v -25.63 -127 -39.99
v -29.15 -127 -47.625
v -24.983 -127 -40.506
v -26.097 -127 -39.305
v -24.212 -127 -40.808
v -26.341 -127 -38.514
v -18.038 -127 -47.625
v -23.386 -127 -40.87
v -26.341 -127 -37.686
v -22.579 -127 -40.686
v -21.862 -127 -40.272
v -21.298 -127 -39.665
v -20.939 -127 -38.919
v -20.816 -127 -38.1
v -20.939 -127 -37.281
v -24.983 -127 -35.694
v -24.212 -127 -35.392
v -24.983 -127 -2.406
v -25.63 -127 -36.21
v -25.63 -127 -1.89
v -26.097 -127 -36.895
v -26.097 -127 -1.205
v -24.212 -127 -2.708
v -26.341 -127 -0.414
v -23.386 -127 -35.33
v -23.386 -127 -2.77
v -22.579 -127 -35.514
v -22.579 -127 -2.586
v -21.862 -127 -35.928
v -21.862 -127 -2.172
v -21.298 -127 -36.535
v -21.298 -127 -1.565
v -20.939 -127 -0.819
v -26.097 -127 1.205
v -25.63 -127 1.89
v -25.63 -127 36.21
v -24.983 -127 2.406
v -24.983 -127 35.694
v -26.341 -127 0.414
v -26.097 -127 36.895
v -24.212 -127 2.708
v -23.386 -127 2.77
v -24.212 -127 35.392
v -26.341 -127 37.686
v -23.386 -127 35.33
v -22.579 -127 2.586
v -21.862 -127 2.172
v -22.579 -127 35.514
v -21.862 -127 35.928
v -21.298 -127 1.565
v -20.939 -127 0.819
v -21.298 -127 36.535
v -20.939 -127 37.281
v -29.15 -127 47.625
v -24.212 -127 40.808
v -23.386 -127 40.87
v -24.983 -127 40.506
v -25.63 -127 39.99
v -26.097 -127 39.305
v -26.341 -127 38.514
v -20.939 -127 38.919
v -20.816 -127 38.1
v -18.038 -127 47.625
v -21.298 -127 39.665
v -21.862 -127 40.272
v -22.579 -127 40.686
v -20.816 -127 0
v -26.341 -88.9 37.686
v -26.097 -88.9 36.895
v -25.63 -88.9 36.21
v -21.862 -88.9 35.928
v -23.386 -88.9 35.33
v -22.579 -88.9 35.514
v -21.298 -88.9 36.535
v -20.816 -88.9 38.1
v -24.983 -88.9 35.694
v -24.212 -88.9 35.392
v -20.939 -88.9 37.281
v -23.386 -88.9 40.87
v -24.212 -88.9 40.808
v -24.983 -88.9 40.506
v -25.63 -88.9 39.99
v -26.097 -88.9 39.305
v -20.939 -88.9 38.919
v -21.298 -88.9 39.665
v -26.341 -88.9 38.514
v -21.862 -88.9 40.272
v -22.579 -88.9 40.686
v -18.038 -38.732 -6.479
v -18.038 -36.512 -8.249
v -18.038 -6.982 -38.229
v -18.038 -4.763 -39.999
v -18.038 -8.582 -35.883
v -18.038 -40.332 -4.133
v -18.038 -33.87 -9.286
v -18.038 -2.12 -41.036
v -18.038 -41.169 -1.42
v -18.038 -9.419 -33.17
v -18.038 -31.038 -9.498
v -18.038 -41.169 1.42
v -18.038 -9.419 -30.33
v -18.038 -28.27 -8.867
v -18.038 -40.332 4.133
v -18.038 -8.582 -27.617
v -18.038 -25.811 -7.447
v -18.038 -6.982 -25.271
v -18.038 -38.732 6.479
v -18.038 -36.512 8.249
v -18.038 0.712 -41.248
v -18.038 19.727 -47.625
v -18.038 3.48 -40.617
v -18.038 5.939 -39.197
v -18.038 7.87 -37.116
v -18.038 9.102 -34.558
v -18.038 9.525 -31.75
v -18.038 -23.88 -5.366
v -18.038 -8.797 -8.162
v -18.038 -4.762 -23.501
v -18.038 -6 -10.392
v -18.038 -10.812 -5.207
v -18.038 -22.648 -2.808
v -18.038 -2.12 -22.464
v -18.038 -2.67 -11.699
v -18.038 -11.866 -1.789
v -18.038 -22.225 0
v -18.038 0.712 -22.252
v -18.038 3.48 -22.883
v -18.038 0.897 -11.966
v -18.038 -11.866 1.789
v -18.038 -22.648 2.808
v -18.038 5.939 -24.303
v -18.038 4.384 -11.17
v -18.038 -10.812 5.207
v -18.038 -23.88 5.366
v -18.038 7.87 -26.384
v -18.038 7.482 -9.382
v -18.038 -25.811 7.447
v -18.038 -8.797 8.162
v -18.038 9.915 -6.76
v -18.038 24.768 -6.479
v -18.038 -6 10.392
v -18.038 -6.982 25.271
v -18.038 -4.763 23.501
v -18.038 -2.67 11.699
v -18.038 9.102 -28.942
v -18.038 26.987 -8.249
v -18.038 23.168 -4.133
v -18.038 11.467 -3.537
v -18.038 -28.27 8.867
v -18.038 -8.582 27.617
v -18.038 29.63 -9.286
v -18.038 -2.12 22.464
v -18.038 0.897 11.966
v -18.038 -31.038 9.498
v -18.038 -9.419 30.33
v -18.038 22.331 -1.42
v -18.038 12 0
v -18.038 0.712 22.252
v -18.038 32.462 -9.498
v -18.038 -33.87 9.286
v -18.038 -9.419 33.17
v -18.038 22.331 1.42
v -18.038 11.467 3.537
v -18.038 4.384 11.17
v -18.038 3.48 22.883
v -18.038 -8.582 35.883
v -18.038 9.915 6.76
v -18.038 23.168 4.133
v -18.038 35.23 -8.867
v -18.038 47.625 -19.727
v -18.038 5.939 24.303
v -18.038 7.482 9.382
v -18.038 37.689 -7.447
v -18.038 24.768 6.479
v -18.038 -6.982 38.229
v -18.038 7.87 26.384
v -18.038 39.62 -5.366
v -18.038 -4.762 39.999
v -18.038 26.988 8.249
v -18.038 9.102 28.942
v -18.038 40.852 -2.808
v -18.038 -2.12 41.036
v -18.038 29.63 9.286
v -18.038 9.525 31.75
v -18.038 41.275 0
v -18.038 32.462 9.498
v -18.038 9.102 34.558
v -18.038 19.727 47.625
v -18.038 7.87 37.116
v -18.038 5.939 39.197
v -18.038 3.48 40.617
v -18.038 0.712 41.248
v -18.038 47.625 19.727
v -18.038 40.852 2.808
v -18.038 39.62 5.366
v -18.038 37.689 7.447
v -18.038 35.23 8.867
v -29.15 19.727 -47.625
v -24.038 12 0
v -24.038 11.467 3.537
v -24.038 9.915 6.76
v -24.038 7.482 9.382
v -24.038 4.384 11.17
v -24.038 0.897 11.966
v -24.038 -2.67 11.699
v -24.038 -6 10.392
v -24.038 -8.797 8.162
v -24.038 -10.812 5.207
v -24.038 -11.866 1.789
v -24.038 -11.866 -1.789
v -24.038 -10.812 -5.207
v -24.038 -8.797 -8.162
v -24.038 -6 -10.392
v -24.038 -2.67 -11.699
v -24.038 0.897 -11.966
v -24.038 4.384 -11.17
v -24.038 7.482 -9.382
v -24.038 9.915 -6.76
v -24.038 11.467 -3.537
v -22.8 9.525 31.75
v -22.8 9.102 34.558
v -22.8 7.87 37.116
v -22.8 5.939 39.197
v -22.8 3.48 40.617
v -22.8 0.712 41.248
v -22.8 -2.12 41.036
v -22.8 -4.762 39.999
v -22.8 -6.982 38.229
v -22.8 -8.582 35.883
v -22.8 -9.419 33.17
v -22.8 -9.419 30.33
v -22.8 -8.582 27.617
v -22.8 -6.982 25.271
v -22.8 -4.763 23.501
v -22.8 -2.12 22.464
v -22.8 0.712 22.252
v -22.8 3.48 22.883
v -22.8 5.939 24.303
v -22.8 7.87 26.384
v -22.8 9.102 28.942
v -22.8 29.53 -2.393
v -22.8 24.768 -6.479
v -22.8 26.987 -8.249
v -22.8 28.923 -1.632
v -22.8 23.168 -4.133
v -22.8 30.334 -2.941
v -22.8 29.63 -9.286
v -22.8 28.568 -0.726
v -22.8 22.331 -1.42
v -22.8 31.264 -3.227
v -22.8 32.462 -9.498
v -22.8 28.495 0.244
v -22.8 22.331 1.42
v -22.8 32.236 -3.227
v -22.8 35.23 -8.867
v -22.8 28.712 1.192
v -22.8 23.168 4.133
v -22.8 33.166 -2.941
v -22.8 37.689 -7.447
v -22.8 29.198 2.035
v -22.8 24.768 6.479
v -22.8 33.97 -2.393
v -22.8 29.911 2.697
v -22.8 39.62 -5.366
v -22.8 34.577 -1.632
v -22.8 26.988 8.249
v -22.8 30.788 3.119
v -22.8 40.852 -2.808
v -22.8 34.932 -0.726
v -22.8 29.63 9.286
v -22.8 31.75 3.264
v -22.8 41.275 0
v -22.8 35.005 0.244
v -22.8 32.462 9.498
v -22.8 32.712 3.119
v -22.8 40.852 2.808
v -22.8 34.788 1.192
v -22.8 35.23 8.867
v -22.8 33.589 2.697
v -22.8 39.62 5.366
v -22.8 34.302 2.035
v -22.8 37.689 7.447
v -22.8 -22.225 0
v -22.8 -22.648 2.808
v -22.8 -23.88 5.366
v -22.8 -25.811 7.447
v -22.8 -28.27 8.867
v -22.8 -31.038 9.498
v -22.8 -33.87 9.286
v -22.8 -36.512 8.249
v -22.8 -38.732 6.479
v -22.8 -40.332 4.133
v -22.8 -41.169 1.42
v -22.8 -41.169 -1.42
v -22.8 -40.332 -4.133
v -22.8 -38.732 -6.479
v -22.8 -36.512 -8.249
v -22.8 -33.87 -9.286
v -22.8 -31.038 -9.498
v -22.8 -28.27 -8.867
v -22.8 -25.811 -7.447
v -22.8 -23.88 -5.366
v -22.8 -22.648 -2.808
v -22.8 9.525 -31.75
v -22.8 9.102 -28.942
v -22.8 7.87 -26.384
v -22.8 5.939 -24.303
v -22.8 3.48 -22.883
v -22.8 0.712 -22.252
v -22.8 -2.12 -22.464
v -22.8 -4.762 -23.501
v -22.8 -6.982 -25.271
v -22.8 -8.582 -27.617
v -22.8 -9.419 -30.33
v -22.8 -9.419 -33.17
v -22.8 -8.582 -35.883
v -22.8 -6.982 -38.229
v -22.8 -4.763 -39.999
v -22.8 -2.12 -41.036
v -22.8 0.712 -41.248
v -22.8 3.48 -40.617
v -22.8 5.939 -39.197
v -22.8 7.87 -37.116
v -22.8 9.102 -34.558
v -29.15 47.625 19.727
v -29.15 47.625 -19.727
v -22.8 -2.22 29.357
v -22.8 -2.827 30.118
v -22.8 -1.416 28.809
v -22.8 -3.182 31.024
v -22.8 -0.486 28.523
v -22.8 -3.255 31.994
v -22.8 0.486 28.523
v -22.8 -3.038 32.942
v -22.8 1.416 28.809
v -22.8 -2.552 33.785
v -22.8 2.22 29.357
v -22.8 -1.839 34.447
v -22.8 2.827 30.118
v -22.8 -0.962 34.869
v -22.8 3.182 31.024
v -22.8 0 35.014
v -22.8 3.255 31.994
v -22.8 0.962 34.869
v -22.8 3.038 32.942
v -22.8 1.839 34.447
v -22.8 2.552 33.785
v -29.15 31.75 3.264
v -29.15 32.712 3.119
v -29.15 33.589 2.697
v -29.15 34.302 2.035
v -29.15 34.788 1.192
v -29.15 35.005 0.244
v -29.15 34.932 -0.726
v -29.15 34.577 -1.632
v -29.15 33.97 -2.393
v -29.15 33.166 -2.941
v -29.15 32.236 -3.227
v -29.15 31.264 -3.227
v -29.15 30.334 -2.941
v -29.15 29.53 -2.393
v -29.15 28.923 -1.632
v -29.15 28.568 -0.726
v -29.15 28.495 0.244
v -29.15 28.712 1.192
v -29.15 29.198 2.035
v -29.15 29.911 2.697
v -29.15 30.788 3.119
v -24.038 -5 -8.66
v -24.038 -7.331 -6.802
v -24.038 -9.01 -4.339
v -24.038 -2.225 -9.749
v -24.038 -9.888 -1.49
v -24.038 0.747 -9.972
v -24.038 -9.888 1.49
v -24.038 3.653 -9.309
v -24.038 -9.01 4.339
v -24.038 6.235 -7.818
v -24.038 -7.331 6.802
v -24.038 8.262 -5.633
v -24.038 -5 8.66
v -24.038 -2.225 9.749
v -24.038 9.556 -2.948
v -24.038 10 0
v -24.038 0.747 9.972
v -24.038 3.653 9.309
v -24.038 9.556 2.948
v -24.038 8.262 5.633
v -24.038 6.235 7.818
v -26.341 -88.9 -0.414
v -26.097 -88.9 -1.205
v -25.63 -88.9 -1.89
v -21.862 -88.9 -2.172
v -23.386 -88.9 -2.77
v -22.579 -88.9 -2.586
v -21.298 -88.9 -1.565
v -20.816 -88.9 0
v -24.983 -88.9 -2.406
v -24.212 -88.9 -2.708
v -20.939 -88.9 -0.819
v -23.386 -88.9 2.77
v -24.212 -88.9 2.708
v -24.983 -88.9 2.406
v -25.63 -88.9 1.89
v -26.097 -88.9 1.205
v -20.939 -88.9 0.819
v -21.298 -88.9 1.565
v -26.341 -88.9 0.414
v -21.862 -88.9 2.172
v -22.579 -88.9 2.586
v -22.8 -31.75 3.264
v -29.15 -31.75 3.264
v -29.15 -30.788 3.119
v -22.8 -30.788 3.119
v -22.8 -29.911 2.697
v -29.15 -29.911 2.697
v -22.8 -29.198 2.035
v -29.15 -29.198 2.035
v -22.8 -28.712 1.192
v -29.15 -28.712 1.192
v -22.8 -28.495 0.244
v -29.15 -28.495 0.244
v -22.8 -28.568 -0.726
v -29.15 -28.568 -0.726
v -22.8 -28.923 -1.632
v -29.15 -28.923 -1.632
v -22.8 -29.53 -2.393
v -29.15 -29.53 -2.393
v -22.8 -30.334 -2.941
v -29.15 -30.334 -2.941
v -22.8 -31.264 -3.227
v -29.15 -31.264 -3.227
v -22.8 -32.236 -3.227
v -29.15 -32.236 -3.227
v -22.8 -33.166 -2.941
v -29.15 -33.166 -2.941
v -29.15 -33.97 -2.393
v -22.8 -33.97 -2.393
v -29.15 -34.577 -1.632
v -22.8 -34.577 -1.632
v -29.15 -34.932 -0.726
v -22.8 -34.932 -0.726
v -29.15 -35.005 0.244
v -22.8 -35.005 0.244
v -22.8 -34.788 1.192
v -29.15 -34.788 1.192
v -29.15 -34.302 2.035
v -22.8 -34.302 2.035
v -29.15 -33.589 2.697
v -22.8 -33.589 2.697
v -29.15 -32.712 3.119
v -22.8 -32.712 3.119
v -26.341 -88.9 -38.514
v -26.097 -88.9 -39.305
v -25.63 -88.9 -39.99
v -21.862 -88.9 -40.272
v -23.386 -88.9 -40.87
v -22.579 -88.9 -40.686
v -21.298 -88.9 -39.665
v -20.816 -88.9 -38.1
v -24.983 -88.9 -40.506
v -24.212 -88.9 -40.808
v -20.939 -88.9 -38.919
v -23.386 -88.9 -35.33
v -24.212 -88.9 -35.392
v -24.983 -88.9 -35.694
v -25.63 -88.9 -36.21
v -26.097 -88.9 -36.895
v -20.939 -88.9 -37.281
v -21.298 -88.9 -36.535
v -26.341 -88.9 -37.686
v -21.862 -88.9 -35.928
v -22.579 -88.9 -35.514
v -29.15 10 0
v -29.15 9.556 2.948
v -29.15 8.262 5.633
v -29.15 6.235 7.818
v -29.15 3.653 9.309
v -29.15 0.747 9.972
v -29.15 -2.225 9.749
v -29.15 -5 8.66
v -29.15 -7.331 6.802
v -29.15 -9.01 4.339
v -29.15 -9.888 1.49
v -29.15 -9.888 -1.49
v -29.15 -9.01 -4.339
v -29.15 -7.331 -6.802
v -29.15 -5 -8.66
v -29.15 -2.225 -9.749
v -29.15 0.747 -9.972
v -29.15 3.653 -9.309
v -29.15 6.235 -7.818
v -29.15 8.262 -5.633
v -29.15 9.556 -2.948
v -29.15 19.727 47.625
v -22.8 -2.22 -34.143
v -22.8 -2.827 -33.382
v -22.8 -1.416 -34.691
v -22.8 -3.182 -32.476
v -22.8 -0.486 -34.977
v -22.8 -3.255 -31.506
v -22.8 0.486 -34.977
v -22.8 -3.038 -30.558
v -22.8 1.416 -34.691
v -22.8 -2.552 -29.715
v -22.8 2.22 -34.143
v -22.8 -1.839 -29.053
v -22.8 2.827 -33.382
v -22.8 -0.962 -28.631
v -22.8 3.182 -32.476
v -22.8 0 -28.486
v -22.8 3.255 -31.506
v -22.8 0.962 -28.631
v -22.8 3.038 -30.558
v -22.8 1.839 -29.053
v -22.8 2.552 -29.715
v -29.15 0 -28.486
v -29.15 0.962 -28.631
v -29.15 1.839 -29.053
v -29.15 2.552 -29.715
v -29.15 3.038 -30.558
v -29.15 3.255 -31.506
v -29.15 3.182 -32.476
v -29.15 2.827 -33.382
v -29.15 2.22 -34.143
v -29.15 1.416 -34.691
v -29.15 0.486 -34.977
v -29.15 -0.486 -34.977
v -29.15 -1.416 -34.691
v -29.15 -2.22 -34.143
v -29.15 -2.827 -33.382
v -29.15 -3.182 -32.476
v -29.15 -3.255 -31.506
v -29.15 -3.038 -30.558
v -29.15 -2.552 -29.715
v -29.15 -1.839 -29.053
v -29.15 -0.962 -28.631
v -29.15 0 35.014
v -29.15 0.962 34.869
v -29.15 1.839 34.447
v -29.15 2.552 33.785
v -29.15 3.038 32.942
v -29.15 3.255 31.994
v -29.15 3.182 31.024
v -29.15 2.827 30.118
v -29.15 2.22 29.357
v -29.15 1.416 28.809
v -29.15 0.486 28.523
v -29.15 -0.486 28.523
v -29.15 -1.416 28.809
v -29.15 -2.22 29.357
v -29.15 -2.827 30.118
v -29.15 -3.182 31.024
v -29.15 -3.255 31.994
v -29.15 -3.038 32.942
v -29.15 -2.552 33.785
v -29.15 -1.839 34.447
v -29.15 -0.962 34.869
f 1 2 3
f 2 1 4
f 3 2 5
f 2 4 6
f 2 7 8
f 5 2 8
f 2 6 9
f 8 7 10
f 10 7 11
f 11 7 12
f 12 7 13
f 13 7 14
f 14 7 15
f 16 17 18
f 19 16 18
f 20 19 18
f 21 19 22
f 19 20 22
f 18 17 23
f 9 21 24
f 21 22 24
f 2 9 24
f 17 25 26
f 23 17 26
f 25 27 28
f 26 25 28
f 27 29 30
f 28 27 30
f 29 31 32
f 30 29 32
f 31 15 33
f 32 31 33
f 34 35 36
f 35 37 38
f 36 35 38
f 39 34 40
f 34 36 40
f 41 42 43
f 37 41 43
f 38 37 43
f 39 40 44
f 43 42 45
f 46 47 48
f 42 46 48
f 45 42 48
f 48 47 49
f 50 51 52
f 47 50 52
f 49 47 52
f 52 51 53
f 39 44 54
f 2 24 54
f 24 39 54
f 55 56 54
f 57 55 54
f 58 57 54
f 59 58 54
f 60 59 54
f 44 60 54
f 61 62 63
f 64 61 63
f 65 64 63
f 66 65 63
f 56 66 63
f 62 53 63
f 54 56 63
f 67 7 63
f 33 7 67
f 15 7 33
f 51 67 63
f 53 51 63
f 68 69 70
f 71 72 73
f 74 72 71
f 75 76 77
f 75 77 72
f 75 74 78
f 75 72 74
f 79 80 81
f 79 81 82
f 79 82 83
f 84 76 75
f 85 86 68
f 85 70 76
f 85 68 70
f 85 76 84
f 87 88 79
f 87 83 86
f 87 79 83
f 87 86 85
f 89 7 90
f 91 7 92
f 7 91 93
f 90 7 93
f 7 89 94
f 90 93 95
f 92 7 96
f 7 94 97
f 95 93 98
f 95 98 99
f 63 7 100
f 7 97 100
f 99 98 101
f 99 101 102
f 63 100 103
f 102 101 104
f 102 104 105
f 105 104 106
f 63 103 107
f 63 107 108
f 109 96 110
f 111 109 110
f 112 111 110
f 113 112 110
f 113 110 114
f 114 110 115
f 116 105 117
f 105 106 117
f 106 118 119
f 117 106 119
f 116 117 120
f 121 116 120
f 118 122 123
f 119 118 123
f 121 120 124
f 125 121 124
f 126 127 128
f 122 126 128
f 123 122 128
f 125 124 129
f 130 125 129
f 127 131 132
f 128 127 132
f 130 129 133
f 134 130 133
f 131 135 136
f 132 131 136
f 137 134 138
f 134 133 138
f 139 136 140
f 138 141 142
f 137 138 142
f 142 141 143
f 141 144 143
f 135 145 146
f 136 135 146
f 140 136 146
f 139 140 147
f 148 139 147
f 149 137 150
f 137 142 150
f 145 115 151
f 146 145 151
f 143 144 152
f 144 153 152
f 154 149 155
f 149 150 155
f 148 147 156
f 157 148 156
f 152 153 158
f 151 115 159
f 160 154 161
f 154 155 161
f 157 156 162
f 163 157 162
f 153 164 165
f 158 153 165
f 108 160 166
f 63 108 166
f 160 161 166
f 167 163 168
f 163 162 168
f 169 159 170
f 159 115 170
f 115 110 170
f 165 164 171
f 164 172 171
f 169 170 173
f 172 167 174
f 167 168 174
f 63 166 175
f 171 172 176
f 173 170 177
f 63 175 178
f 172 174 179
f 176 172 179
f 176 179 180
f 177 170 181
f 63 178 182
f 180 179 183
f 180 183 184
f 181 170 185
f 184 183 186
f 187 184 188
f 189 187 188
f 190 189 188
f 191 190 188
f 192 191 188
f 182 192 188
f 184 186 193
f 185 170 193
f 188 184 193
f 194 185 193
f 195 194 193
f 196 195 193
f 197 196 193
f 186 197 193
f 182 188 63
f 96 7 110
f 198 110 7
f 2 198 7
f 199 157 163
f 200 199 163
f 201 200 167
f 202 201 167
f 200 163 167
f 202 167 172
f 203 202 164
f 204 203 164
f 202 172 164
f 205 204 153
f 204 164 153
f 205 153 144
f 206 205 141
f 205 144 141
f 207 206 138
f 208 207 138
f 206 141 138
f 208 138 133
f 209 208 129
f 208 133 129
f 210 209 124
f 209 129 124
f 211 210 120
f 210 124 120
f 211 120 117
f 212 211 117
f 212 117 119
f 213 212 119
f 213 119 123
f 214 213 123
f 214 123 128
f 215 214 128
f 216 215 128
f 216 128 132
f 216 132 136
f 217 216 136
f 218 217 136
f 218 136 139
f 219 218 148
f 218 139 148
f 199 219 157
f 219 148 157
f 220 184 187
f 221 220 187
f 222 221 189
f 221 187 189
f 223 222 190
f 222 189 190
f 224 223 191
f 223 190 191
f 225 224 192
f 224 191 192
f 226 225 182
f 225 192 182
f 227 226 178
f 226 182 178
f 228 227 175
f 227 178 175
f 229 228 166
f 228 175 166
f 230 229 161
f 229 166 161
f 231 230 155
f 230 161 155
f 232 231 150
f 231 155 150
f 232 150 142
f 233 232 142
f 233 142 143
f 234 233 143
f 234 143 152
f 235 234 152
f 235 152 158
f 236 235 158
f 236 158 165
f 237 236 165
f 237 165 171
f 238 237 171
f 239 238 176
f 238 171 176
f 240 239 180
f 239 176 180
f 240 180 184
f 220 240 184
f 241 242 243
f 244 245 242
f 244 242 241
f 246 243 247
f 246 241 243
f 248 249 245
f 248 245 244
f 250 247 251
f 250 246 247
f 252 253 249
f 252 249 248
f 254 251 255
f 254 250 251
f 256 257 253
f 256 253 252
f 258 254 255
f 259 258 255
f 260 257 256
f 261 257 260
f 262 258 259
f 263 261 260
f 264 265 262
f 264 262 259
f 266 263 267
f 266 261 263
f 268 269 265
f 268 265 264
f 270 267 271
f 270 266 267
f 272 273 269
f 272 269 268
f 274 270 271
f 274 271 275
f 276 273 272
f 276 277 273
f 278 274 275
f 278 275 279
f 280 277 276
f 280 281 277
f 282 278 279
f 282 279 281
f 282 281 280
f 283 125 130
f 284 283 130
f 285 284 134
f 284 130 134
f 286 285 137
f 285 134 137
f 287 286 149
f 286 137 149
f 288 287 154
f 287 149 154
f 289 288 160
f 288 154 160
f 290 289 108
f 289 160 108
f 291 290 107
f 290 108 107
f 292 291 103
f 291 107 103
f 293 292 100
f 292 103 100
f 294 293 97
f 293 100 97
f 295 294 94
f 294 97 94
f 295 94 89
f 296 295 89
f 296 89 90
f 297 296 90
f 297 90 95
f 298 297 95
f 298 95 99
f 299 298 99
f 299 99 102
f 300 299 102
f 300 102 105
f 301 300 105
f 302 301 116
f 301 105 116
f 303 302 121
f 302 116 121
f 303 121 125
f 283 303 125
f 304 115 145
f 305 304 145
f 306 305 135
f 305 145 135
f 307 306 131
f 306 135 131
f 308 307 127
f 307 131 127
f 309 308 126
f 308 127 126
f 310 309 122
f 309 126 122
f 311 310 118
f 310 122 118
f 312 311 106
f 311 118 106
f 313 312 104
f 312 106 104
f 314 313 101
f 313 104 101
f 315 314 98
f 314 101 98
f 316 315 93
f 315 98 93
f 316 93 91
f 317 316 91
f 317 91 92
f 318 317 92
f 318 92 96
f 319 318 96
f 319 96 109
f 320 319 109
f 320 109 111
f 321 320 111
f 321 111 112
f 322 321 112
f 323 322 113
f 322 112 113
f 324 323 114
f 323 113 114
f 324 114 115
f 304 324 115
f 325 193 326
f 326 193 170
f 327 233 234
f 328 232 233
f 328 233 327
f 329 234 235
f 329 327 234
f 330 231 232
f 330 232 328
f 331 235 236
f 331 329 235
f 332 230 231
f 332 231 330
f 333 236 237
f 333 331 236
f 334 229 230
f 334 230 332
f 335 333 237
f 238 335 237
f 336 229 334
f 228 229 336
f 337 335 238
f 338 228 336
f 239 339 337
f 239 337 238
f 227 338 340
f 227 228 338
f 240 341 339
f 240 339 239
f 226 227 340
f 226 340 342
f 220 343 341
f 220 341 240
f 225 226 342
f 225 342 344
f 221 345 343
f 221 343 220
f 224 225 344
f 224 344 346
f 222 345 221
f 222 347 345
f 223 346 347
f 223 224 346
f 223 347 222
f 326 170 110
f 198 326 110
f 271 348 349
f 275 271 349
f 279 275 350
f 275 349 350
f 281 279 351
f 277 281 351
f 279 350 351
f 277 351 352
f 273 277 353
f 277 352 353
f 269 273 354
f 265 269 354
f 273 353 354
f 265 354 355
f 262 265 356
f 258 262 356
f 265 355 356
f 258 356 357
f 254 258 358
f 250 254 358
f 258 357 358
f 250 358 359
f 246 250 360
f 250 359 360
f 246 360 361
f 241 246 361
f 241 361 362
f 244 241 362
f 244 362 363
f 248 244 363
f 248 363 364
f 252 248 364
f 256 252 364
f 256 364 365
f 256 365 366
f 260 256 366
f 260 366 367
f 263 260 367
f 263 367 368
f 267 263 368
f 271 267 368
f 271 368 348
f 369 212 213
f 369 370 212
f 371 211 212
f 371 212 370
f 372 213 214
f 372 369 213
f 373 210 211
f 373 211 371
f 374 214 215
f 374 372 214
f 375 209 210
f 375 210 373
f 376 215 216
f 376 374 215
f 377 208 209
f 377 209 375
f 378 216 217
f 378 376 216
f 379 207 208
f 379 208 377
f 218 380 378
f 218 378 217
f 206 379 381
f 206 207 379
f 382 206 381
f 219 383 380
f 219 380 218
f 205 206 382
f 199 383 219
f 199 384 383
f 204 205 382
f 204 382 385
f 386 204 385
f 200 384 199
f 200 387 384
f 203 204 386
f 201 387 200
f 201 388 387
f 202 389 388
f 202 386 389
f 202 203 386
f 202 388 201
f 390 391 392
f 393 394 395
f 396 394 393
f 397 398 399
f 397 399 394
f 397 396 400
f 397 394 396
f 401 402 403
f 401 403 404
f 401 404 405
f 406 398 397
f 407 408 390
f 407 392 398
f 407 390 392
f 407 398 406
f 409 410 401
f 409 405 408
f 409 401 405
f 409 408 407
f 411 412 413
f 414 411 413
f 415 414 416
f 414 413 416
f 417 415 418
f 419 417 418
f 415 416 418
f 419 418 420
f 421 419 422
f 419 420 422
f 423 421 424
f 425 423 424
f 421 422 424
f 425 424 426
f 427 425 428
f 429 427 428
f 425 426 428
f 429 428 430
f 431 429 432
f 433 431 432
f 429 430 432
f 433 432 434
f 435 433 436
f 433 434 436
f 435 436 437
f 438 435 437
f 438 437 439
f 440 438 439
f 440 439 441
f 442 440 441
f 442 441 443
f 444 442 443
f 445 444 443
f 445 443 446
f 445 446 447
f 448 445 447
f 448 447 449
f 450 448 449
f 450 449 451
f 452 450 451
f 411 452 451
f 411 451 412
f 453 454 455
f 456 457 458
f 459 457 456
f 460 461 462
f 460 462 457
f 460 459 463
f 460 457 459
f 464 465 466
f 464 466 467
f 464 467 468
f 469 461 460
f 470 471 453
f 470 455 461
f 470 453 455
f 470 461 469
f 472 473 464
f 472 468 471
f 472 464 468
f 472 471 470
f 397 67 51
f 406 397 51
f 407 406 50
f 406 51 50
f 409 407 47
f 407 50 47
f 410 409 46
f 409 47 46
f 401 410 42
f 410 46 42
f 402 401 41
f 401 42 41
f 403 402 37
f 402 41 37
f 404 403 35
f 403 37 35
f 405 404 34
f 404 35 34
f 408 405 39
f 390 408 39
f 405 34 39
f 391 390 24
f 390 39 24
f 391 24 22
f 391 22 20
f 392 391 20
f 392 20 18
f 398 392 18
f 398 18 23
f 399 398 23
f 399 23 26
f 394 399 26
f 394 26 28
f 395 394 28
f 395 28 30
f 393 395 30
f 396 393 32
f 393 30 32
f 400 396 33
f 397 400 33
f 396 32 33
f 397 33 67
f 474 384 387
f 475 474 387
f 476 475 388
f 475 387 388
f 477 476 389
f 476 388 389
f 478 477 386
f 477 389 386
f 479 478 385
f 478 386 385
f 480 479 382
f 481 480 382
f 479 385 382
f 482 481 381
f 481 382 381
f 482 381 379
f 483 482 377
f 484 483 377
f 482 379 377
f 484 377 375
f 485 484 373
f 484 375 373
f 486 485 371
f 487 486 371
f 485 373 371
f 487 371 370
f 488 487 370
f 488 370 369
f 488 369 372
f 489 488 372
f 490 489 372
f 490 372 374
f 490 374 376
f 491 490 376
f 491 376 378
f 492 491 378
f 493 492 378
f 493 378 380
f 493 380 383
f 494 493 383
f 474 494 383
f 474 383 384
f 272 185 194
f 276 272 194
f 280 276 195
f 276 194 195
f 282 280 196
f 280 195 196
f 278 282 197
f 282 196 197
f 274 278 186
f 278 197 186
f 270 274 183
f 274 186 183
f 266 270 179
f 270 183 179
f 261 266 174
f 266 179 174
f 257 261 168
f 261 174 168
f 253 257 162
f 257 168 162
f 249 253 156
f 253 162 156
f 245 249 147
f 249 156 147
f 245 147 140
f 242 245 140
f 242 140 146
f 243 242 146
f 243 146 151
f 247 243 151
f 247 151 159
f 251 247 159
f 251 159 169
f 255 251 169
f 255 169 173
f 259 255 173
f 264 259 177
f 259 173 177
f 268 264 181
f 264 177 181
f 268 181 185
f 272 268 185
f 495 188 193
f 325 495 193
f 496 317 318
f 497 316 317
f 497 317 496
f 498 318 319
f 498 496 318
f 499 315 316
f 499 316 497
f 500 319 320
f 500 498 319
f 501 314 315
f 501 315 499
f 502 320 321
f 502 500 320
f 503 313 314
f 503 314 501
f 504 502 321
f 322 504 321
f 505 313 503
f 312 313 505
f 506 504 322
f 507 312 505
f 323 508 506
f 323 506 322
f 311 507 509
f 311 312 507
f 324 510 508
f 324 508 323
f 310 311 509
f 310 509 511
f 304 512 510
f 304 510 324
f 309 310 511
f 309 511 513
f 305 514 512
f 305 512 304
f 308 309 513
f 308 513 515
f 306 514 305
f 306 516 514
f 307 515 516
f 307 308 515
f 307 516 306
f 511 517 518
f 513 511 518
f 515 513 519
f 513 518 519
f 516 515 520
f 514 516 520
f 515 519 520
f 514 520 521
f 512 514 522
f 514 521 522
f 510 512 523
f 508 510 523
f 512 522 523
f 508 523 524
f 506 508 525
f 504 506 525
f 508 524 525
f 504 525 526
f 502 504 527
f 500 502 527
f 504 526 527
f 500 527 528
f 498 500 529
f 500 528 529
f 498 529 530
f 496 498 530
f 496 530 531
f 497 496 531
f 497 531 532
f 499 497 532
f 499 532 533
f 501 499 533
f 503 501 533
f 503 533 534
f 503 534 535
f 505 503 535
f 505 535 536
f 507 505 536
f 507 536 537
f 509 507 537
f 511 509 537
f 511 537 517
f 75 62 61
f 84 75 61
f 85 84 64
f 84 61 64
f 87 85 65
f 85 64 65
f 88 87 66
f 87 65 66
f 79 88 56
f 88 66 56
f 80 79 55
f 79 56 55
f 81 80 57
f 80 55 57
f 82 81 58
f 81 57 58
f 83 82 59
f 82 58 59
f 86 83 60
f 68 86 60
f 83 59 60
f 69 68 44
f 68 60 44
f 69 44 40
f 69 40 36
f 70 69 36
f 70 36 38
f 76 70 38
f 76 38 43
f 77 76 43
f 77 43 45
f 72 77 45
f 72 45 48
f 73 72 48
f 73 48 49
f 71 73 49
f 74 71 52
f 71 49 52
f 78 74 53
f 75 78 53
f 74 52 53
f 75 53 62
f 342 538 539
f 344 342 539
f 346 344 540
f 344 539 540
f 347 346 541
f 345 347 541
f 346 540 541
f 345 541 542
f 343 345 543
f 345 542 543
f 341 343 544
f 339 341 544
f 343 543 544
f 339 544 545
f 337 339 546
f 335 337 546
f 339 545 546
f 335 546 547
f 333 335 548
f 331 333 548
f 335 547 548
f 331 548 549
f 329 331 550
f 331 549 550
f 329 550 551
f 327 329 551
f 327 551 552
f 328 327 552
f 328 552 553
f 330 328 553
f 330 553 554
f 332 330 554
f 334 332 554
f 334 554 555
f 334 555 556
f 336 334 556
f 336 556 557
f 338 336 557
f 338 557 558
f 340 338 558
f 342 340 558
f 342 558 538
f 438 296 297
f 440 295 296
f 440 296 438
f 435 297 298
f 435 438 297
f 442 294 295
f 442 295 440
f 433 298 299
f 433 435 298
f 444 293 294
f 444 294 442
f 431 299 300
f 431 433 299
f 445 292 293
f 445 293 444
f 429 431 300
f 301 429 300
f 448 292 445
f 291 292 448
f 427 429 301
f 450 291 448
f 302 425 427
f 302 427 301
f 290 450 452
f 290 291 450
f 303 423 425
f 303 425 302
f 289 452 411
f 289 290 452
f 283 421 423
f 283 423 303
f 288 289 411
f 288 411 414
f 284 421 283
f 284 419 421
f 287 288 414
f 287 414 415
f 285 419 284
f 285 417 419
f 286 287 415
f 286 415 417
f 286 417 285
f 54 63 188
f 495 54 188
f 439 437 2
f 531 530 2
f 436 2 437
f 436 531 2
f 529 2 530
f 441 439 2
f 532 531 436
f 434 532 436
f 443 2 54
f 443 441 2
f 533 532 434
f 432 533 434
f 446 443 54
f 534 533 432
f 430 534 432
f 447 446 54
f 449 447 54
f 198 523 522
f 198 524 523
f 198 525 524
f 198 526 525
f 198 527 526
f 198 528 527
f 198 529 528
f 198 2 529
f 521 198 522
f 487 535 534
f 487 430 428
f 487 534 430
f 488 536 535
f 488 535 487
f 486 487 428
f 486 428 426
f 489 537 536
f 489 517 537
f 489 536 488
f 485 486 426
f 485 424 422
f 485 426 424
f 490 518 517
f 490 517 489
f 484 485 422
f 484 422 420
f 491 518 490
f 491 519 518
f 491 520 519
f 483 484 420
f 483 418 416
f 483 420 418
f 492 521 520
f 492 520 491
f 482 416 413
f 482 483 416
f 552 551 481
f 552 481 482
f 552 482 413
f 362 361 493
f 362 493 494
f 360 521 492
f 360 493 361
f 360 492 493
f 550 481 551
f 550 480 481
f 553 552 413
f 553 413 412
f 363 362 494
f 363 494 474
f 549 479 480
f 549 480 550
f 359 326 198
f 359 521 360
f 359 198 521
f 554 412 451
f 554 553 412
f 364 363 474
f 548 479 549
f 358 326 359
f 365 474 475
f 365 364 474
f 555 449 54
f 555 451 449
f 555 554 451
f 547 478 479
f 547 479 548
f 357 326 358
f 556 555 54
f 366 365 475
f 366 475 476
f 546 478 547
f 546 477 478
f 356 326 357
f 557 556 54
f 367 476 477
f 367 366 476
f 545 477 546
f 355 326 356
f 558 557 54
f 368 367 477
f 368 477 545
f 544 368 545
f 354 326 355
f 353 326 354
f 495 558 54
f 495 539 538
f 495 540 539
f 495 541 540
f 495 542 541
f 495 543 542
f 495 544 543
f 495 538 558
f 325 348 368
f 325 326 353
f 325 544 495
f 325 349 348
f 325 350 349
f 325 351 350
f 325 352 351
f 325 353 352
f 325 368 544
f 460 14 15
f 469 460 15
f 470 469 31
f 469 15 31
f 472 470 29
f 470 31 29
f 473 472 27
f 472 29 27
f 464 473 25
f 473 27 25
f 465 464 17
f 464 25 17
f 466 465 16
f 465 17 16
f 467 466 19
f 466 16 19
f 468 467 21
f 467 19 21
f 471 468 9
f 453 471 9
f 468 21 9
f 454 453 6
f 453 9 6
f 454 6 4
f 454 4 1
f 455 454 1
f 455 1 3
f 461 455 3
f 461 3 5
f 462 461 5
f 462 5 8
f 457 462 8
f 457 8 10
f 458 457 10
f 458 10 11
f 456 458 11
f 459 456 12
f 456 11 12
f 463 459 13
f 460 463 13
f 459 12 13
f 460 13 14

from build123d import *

# Parameters (mm, degrees)
BOSS_EXTRUDE1_DEPTH = 11.1125
SKETCH2_R           = 12
CUT_EXTRUDE1_DEPTH  = 6
SKETCH3_R           = 10
CUT_EXTRUDE2_DEPTH  = 136.768702671
SKETCH4_R           = 3.2639
CUT_EXTRUDE3_DEPTH  = 137.09051503
SKETCH5_R           = 9.525
CUT_EXTRUDE4_DEPTH  = 4.7625
SKETCH6_R           = 2.778125
CUT_EXTRUDE5_DEPTH  = 38.1


with BuildPart() as part:
    # Sketch1 → Boss-Extrude1 (new body)
    with BuildSketch(Plane(origin=(-18.0375, 0, 0), x_dir=(0, 0, -1), z_dir=(1, 0, 0))):
        Polygon((-47.625, -127), (-47.625, 19.726920908), (-19.726920908, 47.625), (19.726920908, 47.625), (47.625, 19.726920908), (47.625, -127), align=None)
    extrude(amount=-BOSS_EXTRUDE1_DEPTH)

    # Sketch2 → Cut-Extrude1 (cut)
    with BuildSketch(Plane(origin=(-18.0375, 0, 0), x_dir=(0, 0, -1), z_dir=(1, 0, 0))):
        with Locations(Location((0, 0, 0), (0, 0, 90))):
            Circle(SKETCH2_R)
    extrude(amount=-CUT_EXTRUDE1_DEPTH, mode=Mode.SUBTRACT)

    # Sketch3 → Cut-Extrude2 (cut, through all)
    with BuildSketch(Plane(origin=(-24.0375, 0, 0), x_dir=(0, 0, -1), z_dir=(1, 0, 0))):
        with Locations(Location((0, 0, 0), (0, 0, 90))):
            Circle(SKETCH3_R)
    extrude(amount=-CUT_EXTRUDE2_DEPTH, mode=Mode.SUBTRACT)

    # Sketch4 → Cut-Extrude3 (cut, through all)
    with BuildSketch(Plane.ZY.offset(29.15)):
        with Locations((0, -31.75)):
            Circle(SKETCH4_R)
        with Locations((31.75, 0)):
            Circle(SKETCH4_R)
        with Locations((-31.75, 0)):
            Circle(SKETCH4_R)
        with Locations((0, 31.75)):
            Circle(SKETCH4_R)
    extrude(amount=-CUT_EXTRUDE3_DEPTH, mode=Mode.SUBTRACT)

    # Sketch5 → Cut-Extrude4 (cut)
    with BuildSketch(Plane(origin=(-18.0375, 0, 0), x_dir=(0, 0, -1), z_dir=(1, 0, 0))):
        with Locations(Location((-31.75, 0, 0), (0, 0, 90))):
            Circle(SKETCH5_R)
        with Locations(Location((0, 31.75, 0), (0, 0, 90))):
            Circle(SKETCH5_R)
        with Locations(Location((31.75, 0, 0), (0, 0, 90))):
            Circle(SKETCH5_R)
        with Locations(Location((0, -31.75, 0), (0, 0, 90))):
            Circle(SKETCH5_R)
    extrude(amount=-CUT_EXTRUDE4_DEPTH, mode=Mode.SUBTRACT)

    # Sketch6 → Cut-Extrude5 (cut)
    with BuildSketch(Plane.XZ.offset(127)):
        with Locations((-23.59375, 0)):
            Circle(SKETCH6_R)
        with Locations((-23.59375, 38.1)):
            Circle(SKETCH6_R)
        with Locations((-23.59375, -38.1)):
            Circle(SKETCH6_R)
    extrude(amount=-CUT_EXTRUDE5_DEPTH, mode=Mode.SUBTRACT)


solid = part.part
